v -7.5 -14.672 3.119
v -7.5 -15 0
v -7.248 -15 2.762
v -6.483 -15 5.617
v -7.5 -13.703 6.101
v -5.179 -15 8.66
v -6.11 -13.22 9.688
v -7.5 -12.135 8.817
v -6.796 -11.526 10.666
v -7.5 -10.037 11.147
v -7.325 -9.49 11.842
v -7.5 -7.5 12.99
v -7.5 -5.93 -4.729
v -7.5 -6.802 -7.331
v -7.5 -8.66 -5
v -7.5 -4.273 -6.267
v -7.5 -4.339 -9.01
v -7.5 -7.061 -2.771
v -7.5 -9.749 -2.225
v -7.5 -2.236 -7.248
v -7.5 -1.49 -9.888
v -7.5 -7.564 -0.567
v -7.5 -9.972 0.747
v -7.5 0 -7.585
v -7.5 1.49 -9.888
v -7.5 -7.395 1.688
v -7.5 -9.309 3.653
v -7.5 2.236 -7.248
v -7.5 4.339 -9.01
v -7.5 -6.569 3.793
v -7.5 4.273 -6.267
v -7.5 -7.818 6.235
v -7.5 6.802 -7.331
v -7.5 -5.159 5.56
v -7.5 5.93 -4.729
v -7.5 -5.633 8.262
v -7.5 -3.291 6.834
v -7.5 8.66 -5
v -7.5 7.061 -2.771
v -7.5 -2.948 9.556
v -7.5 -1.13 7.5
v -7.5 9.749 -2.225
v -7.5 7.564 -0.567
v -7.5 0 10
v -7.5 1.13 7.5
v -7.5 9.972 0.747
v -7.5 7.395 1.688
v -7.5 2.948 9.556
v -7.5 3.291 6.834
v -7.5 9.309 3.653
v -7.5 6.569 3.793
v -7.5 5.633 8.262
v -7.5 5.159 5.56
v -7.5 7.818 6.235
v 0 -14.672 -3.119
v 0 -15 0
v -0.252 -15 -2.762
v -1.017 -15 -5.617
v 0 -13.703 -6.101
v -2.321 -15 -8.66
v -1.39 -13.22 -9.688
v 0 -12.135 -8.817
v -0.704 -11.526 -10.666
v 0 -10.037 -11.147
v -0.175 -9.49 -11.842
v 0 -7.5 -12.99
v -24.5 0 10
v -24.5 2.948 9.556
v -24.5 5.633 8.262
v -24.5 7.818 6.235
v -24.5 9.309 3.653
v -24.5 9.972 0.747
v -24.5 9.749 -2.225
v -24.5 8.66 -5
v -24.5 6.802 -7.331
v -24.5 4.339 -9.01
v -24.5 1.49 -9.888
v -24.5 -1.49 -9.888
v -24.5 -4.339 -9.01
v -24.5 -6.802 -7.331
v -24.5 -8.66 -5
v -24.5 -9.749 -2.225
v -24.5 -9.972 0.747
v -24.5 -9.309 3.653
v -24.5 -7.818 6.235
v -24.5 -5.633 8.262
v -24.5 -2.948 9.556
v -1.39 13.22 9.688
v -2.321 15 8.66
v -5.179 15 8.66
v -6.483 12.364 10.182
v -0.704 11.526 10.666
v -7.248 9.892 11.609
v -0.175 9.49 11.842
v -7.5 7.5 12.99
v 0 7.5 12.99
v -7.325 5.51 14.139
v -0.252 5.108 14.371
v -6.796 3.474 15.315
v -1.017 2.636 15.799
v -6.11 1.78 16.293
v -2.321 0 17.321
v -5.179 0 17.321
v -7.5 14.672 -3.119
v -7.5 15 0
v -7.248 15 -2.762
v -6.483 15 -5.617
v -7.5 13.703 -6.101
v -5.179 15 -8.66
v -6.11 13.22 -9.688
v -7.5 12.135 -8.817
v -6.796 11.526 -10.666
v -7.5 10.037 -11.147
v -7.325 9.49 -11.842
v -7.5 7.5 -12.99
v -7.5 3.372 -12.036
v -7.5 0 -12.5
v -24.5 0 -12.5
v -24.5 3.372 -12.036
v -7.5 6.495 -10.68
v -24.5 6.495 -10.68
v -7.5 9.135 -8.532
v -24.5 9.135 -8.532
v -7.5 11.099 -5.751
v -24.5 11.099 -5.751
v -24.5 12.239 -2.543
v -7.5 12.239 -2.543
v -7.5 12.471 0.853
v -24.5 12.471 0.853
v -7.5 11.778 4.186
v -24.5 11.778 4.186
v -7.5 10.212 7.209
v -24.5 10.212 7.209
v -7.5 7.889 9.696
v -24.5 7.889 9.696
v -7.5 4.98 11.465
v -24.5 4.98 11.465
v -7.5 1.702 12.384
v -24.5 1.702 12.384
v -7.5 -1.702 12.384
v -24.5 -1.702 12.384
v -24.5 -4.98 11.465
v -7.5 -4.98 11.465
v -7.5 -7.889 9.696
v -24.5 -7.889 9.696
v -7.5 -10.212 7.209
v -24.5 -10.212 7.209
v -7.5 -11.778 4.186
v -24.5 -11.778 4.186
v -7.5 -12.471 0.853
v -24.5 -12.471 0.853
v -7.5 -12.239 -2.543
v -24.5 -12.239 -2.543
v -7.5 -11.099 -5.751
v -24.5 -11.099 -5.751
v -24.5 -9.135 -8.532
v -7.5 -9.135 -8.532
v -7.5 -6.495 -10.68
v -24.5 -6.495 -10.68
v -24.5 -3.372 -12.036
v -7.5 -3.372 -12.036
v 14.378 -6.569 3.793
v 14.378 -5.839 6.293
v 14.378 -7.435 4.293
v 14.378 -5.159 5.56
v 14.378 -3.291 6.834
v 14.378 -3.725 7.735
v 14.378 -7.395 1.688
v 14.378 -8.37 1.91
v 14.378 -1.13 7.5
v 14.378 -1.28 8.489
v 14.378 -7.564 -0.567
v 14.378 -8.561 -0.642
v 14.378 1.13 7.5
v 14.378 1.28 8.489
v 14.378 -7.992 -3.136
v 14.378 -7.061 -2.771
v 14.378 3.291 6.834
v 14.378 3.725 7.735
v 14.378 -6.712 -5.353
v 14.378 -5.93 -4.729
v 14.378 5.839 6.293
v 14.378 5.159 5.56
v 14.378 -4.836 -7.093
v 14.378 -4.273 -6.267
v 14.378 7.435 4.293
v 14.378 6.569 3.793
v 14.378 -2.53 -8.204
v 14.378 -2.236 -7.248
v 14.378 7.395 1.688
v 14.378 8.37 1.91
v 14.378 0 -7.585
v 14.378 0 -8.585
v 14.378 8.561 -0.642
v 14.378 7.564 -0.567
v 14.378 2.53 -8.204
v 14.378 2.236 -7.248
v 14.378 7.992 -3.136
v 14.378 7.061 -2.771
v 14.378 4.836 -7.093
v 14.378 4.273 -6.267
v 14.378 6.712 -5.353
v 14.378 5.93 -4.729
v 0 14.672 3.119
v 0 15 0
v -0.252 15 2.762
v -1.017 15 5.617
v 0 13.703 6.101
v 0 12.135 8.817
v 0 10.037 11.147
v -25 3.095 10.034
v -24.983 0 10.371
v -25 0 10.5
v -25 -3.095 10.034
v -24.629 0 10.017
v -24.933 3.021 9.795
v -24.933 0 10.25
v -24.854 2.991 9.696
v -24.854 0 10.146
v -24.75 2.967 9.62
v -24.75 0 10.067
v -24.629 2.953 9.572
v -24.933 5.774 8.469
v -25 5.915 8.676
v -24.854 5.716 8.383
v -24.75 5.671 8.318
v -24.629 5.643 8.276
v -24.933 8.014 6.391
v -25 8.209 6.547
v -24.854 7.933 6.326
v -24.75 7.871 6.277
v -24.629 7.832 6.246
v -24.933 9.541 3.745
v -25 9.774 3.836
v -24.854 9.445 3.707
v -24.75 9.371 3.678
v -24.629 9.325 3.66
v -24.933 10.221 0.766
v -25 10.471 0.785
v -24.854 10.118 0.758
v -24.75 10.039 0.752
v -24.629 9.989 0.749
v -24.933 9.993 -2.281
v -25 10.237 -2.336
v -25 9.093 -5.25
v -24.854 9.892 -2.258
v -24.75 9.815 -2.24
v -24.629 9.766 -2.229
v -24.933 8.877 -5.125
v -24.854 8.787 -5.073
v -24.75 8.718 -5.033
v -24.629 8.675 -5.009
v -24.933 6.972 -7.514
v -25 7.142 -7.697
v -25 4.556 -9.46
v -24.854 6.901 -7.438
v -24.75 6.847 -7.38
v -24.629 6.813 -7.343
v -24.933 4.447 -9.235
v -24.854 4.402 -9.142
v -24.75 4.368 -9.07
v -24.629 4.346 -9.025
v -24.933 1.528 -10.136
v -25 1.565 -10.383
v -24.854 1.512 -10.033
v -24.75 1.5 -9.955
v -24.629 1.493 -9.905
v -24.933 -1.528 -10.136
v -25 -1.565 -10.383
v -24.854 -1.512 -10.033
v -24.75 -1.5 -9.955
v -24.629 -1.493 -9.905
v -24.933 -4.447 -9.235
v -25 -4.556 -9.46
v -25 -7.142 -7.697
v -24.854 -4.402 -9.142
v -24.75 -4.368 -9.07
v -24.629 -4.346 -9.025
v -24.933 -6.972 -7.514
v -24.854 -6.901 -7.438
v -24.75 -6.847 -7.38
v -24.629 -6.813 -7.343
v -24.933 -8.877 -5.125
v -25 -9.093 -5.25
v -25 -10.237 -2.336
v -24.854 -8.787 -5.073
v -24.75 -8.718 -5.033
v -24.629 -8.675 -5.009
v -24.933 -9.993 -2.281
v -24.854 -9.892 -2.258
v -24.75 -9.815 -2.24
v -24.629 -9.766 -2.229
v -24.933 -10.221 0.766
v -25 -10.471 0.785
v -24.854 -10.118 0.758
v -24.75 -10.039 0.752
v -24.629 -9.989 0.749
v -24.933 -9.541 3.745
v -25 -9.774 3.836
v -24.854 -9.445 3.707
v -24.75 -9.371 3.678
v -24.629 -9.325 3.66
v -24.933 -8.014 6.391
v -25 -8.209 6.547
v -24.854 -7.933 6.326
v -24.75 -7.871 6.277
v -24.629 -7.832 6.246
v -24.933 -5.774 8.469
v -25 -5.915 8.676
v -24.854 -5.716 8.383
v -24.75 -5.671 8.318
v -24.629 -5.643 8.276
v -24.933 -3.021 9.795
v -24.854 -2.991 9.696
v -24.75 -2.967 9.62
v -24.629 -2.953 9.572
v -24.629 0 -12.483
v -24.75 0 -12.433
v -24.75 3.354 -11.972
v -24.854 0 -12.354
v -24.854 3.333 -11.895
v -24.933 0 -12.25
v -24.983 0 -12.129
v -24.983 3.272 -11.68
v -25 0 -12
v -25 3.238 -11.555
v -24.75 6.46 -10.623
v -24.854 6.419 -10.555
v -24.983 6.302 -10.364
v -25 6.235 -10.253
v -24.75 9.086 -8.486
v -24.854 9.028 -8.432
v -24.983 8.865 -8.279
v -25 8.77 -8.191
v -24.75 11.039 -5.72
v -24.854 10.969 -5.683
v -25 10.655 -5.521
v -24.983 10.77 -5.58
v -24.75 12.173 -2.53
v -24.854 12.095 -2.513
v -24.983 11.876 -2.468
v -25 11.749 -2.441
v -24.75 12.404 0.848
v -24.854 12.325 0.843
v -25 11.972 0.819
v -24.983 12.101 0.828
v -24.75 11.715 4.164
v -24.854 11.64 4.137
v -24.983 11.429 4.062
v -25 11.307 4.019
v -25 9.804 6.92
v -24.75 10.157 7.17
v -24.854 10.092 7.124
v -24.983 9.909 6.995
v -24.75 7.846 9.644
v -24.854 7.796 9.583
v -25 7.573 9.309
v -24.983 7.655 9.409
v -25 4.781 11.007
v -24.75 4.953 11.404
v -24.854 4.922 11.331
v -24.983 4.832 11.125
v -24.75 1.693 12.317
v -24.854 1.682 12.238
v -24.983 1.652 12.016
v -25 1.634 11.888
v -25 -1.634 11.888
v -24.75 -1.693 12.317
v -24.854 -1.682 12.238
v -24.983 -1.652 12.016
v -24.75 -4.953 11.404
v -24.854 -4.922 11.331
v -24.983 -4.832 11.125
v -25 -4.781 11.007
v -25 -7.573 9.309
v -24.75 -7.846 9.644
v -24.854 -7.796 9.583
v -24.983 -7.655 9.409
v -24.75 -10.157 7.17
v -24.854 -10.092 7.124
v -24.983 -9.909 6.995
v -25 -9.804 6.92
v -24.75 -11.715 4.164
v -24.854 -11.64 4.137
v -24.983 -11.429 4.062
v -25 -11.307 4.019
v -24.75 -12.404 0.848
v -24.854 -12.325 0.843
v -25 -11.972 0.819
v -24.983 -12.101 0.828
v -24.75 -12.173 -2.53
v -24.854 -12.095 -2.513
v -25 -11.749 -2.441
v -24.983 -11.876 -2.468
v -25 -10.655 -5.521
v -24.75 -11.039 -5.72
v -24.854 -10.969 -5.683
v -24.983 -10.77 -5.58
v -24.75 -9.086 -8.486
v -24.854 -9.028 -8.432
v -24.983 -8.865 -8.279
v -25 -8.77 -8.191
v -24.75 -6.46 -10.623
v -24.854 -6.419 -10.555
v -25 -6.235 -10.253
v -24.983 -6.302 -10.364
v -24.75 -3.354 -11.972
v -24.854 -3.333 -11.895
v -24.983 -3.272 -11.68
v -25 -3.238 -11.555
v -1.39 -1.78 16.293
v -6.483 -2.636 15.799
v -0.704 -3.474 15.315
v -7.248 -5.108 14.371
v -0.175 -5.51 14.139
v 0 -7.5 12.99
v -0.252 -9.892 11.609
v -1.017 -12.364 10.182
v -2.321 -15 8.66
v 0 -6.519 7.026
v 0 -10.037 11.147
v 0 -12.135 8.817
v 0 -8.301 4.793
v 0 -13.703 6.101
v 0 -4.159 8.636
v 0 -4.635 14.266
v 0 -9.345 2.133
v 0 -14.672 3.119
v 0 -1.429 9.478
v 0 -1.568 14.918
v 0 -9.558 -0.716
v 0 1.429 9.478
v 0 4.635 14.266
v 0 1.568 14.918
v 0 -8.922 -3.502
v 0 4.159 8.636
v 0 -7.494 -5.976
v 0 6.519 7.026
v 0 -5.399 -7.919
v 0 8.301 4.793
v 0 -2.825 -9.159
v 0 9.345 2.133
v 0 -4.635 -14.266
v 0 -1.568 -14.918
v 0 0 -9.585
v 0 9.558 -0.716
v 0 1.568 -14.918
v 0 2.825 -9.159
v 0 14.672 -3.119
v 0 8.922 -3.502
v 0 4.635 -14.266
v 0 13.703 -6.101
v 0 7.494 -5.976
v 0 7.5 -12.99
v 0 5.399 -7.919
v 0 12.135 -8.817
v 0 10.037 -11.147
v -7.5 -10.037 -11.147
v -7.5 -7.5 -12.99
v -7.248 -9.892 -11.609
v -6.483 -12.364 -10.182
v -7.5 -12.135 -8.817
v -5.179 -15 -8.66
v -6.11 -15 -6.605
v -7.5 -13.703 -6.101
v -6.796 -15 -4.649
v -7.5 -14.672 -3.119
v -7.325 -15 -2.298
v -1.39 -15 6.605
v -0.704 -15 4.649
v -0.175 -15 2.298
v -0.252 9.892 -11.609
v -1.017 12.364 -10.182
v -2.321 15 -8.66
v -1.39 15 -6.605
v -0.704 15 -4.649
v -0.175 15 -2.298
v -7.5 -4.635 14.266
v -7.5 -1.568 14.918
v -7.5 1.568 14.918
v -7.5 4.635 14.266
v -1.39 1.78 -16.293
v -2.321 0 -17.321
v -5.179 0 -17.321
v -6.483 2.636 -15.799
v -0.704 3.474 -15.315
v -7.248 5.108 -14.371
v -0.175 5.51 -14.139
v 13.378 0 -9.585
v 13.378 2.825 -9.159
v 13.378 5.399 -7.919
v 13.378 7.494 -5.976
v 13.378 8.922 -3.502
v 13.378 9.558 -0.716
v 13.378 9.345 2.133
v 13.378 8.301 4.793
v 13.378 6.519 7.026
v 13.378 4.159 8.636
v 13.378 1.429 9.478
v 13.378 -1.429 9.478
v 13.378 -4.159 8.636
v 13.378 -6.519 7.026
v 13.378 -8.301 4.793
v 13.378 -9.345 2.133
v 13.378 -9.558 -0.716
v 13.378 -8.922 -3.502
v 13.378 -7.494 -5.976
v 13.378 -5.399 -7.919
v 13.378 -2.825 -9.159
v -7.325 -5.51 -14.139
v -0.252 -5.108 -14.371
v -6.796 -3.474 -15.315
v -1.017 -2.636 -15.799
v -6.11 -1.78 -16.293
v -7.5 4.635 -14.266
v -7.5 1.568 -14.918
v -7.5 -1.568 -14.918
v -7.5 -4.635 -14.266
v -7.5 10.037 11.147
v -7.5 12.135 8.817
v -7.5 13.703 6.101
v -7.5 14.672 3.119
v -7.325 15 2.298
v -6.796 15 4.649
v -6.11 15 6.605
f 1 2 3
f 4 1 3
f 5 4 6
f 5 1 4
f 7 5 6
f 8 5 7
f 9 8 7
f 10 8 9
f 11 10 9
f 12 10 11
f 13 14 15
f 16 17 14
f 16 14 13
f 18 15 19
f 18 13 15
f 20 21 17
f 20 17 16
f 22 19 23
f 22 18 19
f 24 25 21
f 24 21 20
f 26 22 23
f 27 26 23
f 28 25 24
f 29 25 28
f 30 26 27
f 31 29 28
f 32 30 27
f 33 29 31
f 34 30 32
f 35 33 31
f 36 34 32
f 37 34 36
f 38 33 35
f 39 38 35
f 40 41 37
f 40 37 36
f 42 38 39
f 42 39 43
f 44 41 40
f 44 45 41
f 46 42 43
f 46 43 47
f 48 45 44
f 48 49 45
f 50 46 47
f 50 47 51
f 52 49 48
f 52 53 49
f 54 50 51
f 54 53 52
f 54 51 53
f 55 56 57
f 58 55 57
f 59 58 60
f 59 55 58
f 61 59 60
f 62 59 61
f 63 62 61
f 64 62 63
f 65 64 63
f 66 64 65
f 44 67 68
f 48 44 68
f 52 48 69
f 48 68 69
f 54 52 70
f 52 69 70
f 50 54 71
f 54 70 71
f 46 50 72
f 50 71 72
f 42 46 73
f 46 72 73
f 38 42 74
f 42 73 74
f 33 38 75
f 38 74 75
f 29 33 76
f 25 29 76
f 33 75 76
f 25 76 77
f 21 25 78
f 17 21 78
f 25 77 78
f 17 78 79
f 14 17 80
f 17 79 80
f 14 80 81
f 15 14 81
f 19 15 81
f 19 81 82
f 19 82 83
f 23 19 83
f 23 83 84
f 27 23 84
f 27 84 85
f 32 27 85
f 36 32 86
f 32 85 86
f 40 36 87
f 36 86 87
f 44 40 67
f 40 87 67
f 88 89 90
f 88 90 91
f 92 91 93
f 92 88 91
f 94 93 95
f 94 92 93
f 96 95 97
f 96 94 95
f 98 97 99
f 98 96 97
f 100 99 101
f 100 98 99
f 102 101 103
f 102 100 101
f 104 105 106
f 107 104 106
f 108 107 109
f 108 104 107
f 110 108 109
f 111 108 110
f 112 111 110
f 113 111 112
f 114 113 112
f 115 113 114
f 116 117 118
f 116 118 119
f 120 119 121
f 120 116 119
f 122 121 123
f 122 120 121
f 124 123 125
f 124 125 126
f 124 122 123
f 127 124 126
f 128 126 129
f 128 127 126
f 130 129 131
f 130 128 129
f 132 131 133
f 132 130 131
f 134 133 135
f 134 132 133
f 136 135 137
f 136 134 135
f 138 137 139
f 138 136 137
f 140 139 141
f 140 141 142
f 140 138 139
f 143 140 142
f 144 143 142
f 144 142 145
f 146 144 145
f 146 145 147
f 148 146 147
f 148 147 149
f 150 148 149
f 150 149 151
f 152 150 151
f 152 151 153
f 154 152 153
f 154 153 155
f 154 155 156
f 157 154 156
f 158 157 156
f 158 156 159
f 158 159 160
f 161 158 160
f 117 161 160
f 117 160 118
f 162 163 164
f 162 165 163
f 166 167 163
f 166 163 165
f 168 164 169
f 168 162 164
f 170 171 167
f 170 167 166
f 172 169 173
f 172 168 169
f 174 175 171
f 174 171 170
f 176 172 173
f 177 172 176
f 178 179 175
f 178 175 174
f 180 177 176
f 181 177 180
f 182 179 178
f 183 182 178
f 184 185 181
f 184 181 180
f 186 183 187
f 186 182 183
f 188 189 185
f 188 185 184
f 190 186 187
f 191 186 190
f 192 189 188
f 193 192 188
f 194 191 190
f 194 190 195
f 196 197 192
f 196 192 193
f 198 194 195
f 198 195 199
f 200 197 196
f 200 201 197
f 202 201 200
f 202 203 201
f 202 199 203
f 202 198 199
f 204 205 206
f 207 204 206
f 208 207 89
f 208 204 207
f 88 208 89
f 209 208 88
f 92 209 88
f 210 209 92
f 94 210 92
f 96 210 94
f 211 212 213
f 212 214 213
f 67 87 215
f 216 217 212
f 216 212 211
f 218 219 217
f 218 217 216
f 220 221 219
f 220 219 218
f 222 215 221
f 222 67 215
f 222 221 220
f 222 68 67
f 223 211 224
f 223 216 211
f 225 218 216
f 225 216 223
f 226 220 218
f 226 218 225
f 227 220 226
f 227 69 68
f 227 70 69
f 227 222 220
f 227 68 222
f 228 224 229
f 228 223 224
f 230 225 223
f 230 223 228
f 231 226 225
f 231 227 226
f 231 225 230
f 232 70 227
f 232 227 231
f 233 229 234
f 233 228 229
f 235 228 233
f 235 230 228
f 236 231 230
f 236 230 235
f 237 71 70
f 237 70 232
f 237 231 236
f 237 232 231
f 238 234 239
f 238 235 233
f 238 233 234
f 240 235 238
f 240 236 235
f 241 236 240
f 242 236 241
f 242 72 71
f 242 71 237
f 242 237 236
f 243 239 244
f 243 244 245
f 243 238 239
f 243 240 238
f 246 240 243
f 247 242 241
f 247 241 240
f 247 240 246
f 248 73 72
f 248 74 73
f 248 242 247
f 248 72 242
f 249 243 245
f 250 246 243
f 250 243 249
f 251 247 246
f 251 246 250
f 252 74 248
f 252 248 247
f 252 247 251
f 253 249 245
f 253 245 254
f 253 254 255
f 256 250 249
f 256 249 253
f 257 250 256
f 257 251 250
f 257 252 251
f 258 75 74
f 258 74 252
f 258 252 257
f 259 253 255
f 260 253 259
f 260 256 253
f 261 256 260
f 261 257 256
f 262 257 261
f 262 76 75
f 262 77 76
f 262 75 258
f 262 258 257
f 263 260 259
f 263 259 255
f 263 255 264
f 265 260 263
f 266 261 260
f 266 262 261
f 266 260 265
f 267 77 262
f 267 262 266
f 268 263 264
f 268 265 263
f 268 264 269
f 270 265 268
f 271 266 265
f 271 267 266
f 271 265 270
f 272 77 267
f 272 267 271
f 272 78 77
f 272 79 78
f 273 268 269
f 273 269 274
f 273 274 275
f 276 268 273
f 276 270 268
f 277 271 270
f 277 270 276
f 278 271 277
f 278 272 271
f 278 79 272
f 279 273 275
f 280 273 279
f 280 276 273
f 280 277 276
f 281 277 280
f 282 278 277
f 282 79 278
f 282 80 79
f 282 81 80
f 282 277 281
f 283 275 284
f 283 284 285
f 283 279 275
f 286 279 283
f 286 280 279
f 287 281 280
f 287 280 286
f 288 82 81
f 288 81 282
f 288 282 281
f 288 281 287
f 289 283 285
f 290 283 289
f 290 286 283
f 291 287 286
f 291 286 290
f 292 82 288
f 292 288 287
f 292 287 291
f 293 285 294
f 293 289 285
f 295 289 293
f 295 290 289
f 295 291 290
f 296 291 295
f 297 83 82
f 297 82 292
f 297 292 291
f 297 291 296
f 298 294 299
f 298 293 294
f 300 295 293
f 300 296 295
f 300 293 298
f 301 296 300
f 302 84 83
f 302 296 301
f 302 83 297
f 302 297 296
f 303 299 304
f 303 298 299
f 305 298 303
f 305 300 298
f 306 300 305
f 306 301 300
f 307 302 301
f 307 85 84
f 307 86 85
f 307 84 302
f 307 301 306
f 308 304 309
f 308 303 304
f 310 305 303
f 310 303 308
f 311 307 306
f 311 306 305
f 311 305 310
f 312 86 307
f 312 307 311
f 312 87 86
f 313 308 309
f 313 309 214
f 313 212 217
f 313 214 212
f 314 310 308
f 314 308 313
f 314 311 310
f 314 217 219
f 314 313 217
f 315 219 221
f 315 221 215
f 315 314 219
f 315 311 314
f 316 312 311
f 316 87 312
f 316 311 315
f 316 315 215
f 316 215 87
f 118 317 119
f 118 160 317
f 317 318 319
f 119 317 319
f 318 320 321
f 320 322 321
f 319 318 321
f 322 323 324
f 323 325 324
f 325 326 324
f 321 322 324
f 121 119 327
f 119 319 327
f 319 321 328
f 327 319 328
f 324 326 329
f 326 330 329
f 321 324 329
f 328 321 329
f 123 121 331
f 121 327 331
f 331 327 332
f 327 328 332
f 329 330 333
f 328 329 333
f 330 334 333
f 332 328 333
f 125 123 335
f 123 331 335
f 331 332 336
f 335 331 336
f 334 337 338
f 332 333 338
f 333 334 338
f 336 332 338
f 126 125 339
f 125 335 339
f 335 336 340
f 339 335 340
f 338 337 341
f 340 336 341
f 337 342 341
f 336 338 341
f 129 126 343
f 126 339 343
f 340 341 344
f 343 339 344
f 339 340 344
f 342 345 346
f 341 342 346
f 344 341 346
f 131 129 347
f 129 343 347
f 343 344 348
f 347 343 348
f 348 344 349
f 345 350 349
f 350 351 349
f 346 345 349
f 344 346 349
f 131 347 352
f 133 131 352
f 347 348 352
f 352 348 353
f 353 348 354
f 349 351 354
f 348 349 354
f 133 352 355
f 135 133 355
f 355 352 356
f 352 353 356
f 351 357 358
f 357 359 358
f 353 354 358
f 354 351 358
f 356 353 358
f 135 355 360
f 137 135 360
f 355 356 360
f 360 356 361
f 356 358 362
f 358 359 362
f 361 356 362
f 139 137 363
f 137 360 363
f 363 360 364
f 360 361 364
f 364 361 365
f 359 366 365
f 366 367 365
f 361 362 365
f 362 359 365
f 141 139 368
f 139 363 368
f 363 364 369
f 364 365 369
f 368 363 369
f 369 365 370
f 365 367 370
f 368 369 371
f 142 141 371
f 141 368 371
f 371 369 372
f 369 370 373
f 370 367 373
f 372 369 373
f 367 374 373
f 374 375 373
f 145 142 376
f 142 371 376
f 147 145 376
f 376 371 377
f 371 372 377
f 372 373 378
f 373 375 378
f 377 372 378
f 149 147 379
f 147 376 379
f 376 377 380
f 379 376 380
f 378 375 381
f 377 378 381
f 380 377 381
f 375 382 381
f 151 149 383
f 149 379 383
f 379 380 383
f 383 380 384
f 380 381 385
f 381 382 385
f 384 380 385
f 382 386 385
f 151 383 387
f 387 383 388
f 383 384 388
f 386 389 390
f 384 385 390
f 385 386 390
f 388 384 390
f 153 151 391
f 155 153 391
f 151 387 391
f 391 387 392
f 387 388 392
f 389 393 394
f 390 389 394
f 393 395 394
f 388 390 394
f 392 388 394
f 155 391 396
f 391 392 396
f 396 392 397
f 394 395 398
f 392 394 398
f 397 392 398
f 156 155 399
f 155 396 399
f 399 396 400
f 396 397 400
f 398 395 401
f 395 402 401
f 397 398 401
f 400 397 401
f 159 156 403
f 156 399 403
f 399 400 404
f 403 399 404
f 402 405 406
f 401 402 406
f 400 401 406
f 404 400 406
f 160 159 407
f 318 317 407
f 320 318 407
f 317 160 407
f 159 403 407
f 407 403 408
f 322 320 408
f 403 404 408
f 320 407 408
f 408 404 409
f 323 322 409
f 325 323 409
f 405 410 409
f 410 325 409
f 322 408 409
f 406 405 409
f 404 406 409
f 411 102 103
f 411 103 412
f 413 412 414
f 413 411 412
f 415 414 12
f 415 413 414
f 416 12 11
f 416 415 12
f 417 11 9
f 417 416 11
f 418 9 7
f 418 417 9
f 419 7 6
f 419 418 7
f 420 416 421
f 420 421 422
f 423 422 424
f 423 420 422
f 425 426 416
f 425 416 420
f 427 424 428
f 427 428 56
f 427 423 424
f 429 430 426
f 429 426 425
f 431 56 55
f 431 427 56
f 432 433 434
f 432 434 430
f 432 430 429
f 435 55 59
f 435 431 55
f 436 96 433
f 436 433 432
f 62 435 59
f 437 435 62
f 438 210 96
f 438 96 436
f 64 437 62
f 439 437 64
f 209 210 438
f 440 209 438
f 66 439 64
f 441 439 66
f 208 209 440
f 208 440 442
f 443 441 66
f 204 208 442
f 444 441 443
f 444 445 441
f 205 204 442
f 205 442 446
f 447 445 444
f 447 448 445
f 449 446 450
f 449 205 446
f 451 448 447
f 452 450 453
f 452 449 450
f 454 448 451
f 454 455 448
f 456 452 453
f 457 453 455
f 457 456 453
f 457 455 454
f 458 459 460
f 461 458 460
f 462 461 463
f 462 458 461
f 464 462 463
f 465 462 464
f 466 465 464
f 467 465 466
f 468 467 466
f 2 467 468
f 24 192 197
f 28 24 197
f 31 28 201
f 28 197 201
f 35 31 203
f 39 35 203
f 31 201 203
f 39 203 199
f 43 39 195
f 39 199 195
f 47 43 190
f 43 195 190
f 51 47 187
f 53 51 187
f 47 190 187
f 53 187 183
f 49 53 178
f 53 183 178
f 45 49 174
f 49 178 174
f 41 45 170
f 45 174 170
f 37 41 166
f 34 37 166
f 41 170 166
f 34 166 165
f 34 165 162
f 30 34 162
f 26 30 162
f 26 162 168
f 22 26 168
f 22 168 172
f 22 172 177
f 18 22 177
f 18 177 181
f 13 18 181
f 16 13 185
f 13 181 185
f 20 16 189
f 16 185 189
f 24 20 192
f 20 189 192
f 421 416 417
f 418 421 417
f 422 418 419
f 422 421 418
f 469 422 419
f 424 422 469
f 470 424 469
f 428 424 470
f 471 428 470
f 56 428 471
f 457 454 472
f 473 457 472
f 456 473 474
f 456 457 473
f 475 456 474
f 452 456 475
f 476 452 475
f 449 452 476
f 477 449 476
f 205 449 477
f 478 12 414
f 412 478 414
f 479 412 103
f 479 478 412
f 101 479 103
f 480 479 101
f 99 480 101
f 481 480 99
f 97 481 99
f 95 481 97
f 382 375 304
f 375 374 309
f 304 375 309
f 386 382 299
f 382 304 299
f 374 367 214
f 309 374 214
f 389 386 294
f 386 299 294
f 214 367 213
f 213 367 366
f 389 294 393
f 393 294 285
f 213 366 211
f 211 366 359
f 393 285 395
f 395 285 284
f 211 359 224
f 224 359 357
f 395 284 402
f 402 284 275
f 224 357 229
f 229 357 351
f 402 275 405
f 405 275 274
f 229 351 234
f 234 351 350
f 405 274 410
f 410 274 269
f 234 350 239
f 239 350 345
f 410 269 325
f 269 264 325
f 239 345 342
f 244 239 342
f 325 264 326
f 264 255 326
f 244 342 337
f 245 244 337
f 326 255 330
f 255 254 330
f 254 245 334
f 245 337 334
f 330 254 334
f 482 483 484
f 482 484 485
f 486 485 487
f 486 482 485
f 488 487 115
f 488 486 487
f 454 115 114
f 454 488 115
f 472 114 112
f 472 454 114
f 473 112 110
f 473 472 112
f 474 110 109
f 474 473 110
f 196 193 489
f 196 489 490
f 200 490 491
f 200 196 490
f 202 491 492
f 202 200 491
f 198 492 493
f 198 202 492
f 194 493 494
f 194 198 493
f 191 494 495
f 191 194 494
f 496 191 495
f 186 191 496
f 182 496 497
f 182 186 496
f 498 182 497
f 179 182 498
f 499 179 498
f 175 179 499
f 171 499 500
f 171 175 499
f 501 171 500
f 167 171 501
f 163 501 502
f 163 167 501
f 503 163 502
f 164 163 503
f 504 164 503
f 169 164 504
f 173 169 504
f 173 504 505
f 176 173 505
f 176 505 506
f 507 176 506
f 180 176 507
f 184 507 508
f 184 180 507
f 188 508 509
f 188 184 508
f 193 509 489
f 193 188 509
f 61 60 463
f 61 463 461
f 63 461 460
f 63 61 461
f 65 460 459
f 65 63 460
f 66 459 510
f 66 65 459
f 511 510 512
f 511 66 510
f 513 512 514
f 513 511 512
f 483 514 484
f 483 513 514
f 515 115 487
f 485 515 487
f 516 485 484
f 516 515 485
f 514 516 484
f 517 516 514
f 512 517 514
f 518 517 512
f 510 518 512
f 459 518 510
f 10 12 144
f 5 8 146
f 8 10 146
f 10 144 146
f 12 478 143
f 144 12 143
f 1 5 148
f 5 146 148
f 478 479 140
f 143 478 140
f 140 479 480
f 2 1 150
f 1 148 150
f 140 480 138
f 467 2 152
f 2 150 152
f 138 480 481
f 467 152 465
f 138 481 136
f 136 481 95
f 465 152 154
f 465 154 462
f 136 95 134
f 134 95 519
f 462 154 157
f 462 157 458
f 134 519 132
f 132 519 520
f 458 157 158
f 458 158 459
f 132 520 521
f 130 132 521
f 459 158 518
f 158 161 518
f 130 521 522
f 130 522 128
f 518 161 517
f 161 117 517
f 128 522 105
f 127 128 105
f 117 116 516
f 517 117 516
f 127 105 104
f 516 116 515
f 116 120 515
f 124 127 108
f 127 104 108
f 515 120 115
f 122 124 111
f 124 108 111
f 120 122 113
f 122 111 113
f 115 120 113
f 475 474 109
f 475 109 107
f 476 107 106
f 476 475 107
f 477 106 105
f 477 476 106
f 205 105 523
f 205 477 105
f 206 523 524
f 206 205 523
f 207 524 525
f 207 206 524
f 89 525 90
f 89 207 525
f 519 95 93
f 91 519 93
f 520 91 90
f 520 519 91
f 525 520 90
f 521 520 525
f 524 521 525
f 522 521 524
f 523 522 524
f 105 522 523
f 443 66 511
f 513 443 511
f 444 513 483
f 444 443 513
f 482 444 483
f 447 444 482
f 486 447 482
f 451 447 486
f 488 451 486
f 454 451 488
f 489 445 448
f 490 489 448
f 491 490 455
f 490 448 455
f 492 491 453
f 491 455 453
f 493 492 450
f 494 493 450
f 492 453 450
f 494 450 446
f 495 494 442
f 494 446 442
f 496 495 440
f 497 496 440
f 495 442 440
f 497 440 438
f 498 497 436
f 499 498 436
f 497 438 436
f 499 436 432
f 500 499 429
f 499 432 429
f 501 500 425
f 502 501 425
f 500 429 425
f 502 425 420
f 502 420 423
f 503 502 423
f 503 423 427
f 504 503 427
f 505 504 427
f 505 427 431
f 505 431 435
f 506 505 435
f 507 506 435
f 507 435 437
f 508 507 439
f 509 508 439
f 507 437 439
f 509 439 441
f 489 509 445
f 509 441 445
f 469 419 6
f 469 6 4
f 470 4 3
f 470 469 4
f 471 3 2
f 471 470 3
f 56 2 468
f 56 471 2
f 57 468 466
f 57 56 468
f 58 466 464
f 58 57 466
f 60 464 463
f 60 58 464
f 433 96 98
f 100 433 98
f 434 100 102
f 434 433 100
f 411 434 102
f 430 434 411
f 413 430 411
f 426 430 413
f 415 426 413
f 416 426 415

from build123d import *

# Parameters (mm, degrees)
EXTRUDE_1_DEPTH     = 7.5
SKETCH_2_OUTSIDE_W  = 85.93
SKETCH_2_OUTSIDE_H  = 81.288
SKETCH_2_OUTSIDE_R  = 15
CUT_EXTRUDE_1_DEPTH = 20
CUT_EXTRUDE_1_DRAFT = -45
SKETCH_3_OUTSIDE_W  = 85.93
SKETCH_3_OUTSIDE_H  = 81.288
SKETCH_3_OUTSIDE_R  = 15
CUT_EXTRUDE_2_DEPTH = 20
CUT_EXTRUDE_2_DRAFT = -45
SKETCH_4_R          = 12.5
EXTRUDE_2_DEPTH     = 25
SKETCH_5_R          = 10
CUT_EXTRUDE_3_DEPTH = 17.5
SKETCH_6_R          = 9.585
EXTRUDE_3_DEPTH     = 14.3775
CHAMFER_1_SIZE      = 1
FILLET_1_R          = 0.5
SKETCH_7_R          = 7.585
CUT_EXTRUDE_4_DEPTH = 21.8775


with BuildPart() as part:
    # Эскиз1 → Бобышка-Вытянуть1 (new body)
    with BuildSketch(Plane(origin=(0, 0, 0), x_dir=(0, 0, -1), z_dir=(1, 0, 0))):
        Polygon((17.320508076, 0), (8.660254038, 15), (-8.660254038, 15), (-17.320508076, 0), (-8.660254038, -15), (8.660254038, -15), align=None)
    extrude(amount=-EXTRUDE_1_DEPTH)


with BuildPart() as cut_extrude_1_tool:
    # Эскиз2 outside → Вырез-Вытянуть1 (with draft: the straight prism first)
    with BuildSketch(Plane(origin=(0, 0, 0), x_dir=(0, 0, -1), z_dir=(1, 0, 0))):
        Rectangle(SKETCH_2_OUTSIDE_W, SKETCH_2_OUTSIDE_H)
        Circle(SKETCH_2_OUTSIDE_R, mode=Mode.SUBTRACT)
    extrude(amount=-CUT_EXTRUDE_1_DEPTH)
    # Вырез-Вытянуть1: the draft: its side faces are tilted about the plane it starts from
    cut_extrude_1_sides = [cut_extrude_1_tool.faces().sort_by_distance(p)[0] for p in [
        (-10, -40.644, 0),
        (-10, 0, -42.965),
        (-10, 40.644, 0),
        (-10, 0, 42.965),
        (-10, 0, 15),
    ]]
    draft(cut_extrude_1_sides, Plane(origin=(0, 0, 0), x_dir=(0, 0, -1), z_dir=(1, 0, 0)), CUT_EXTRUDE_1_DRAFT)


with BuildPart() as part_1:
    add(part.part)

    # Вырез-Вытянуть1: cut by cut_extrude_1_tool
    add(cut_extrude_1_tool.part, mode=Mode.SUBTRACT)


with BuildPart() as cut_extrude_2_tool:
    # Эскиз3 outside → Вырез-Вытянуть2 (with draft: the straight prism first)
    with BuildSketch(Plane.ZY.offset(7.5)):
        Rectangle(SKETCH_3_OUTSIDE_W, SKETCH_3_OUTSIDE_H)
        Circle(SKETCH_3_OUTSIDE_R, mode=Mode.SUBTRACT)
    extrude(amount=-CUT_EXTRUDE_2_DEPTH)
    # Вырез-Вытянуть2: the draft: its side faces are tilted about the plane it starts from
    cut_extrude_2_sides = [cut_extrude_2_tool.faces().sort_by_distance(p)[0] for p in [
        (2.5, -40.644, 0),
        (2.5, 0, 42.965),
        (2.5, 40.644, 0),
        (2.5, 0, -42.965),
        (2.5, 0, -15),
    ]]
    draft(cut_extrude_2_sides, Plane.ZY.offset(7.5), CUT_EXTRUDE_2_DRAFT)


with BuildPart() as part_2:
    add(part_1.part)

    # Вырез-Вытянуть2: cut by cut_extrude_2_tool
    add(cut_extrude_2_tool.part, mode=Mode.SUBTRACT)

    # Эскиз4 → Бобышка-Вытянуть2 (add)
    with BuildSketch(Plane(origin=(0, 0, 0), x_dir=(0, 0, -1), z_dir=(1, 0, 0))):
        Circle(SKETCH_4_R)
    extrude(amount=-EXTRUDE_2_DEPTH)

    # Эскиз5 → Вырез-Вытянуть3 (cut)
    with BuildSketch(Plane.ZY.offset(25)):
        Circle(SKETCH_5_R)
    extrude(amount=-CUT_EXTRUDE_3_DEPTH, mode=Mode.SUBTRACT)

    # Эскиз6 → Бобышка-Вытянуть3 (add)
    with BuildSketch(Plane(origin=(0, 0, 0), x_dir=(0, 0, -1), z_dir=(1, 0, 0))):
        Circle(SKETCH_6_R)
    extrude(amount=EXTRUDE_3_DEPTH)

    # Фаска1
    chamfer_1_edges = [part_2.edges().sort_by_distance(p)[0] for p in [
        (14.3775, 0, 9.585),
    ]]
    chamfer(chamfer_1_edges, length=CHAMFER_1_SIZE)

    # Скругление1
    fillet_1_edges = [part_2.edges().sort_by_distance(p)[0] for p in [
        (-25, 0, 12.5),
        (-25, 0, -10),
    ]]
    fillet(fillet_1_edges, radius=FILLET_1_R)

    # Эскиз7 → Вырез-Вытянуть4 (cut)
    with BuildSketch(Plane(origin=(14.3775, 0, 0), x_dir=(0, 0, -1), z_dir=(1, 0, 0))):
        Circle(SKETCH_7_R)
    extrude(amount=-CUT_EXTRUDE_4_DEPTH, mode=Mode.SUBTRACT)


solid = part_2.part
